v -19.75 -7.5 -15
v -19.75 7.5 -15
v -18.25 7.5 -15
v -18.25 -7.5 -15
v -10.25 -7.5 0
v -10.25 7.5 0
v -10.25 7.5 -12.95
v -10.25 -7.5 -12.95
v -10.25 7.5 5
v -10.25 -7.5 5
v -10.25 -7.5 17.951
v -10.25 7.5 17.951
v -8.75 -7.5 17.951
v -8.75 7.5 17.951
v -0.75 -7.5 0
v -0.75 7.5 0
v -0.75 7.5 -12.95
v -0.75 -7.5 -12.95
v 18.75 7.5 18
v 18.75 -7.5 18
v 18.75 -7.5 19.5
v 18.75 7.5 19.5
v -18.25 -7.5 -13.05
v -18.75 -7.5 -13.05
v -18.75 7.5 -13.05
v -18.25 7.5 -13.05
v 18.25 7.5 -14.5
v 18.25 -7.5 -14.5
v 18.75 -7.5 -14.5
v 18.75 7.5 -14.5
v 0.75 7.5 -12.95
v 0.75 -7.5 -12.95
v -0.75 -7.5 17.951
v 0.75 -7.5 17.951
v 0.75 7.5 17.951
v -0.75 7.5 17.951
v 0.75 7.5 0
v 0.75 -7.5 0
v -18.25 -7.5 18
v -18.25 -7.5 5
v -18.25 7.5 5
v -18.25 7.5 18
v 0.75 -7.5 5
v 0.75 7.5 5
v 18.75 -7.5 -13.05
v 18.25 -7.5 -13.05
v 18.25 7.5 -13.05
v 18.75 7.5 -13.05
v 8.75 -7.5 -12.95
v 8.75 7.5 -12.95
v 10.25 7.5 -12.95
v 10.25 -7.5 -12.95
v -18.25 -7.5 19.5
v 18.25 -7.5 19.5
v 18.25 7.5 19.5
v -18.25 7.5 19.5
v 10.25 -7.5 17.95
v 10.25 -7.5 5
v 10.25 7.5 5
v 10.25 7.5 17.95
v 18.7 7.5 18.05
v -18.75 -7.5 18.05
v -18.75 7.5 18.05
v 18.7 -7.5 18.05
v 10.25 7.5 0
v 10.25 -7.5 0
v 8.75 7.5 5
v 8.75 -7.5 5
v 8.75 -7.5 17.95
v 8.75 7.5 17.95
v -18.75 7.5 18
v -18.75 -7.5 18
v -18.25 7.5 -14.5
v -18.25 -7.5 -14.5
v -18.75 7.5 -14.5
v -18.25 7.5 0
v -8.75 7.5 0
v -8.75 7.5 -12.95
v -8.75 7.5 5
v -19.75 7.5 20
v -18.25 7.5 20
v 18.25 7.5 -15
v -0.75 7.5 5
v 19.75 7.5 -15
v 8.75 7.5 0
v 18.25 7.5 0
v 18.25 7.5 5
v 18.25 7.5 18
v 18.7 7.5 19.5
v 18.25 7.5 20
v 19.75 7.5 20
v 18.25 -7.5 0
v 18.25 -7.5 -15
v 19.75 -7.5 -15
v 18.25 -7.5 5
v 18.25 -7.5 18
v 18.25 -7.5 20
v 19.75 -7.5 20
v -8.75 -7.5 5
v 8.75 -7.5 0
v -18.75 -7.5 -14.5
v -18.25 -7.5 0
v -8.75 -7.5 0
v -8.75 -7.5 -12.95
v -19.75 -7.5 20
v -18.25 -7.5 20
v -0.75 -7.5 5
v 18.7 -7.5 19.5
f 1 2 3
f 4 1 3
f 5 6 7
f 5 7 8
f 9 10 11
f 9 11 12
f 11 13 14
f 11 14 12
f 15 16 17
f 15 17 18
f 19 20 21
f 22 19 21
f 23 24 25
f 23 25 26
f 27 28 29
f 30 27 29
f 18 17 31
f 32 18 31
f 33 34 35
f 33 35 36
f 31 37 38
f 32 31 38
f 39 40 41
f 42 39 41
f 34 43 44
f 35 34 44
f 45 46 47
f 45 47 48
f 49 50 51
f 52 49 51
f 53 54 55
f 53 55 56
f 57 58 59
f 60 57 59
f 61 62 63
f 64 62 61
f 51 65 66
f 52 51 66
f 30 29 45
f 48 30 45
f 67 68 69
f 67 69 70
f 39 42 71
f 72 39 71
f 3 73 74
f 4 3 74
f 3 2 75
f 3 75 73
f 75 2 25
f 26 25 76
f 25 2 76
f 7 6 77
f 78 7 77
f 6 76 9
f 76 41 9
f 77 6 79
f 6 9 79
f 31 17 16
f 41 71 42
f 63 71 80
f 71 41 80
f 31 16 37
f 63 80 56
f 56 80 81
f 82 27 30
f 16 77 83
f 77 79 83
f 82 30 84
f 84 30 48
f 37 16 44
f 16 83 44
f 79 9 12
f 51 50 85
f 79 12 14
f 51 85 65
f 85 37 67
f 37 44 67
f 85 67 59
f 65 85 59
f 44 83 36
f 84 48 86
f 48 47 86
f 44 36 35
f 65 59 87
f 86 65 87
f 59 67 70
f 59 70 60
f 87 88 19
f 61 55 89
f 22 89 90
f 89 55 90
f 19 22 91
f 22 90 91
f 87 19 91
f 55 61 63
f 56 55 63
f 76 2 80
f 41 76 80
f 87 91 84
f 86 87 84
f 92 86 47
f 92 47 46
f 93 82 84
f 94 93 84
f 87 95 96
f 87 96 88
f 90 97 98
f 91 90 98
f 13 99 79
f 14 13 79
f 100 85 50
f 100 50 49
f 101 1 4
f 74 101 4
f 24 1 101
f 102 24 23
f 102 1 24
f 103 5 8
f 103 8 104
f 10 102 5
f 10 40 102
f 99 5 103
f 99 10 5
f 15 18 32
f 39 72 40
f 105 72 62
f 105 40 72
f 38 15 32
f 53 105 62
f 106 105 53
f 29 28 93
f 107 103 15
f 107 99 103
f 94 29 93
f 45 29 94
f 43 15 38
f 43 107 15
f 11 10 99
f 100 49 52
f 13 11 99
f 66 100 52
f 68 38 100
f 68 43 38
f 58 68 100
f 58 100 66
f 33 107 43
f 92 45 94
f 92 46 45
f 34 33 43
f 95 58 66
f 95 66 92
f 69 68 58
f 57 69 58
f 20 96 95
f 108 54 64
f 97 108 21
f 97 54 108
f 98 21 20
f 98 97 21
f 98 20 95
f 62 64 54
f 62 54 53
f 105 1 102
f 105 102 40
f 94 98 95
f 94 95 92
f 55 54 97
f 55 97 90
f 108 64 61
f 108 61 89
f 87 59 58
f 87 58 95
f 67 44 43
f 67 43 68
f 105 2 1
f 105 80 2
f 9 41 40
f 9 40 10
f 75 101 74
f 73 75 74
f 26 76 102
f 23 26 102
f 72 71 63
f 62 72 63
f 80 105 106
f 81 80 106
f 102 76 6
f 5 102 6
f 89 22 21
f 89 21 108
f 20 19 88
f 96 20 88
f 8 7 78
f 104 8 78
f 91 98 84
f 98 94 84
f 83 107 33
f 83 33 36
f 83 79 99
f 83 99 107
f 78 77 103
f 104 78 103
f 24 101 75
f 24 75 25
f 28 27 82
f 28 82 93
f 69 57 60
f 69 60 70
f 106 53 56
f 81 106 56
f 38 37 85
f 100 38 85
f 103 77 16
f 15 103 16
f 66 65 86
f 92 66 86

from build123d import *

# Parameters (mm, degrees)
F0_W      = 39.5
F0_H      = 15
F1_DEPTH  = 5
F2_W      = 1.5
F2_H      = 15
F3_DEPTH  = 15
F5_W      = 1.5
F5_H      = 15
F6_DEPTH  = 15
F7_DEPTH  = 12.95
F9_W      = 0.5
F9_H      = 1.5
F10_DEPTH = 15
F9_W_2    = 1.5
F9_H_2    = 2.05
F9_H_3    = 2.0491243154
F11_DEPTH = 15
F13_DEPTH = 15
F14_W     = 0.5
F14_H     = 1.45
F15_DEPTH = 15


# Not quite as in the source:
# - the program builds the solid bodies; features that only make, move or delete a surface that nothing else refers to are left out


with BuildPart() as f1:
    # F0 (on Top) → F1 (new body)
    with BuildSketch(Plane.XY):
        Rectangle(F0_W, F0_H)
    extrude(amount=F1_DEPTH)

    # F2 (on face) → F3 (join)
    with BuildSketch(Plane.XY.offset(5)):
        with Locations((-19, 0)):
            Rectangle(F2_W, F2_H)
        with Locations((-9.5, 0)):
            Rectangle(F2_W, F2_H)
        Rectangle(F2_W, F2_H)
        with Locations((9.5, 0)):
            Rectangle(F2_W, F2_H)
        with Locations((19, 0)):
            Rectangle(F2_W, F2_H)
    extrude(amount=F3_DEPTH)

    # F5 (on face) → F6 (join)
    with BuildSketch(Plane(origin=(0, 0, 0), x_dir=(1, 0, 0), z_dir=(0, 0, -1))):
        with Locations((-19, 0)):
            Rectangle(F5_W, F5_H)
        with Locations((19, 0)):
            Rectangle(F5_W, F5_H)
    extrude(amount=F6_DEPTH)

    # F5 (on face) → F7 (join)
    with BuildSketch(Plane(origin=(0, 0, 0), x_dir=(1, 0, 0), z_dir=(0, 0, -1))):
        with Locations((-9.5, 0)):
            Rectangle(F5_W, F5_H)
        Rectangle(F5_W, F5_H)
        with Locations((9.5, 0)):
            Rectangle(F5_W, F5_H)
    extrude(amount=F7_DEPTH)

    # F9 (on face) → F10 (cut)
    with BuildSketch(Plane(origin=(0, 7.5, 0), x_dir=(-1, 0, 0), z_dir=(0, 1, 0))):
        with Locations((18.5, 18.75)):
            Rectangle(F9_W, F9_H)
        with Locations((-18.5, 18.75)):
            Rectangle(F9_W, F9_H)
    extrude(amount=-F10_DEPTH, mode=Mode.SUBTRACT)

    # F9 (on face) → F11 (cut)
    with BuildSketch(Plane(origin=(0, 7.5, 0), x_dir=(-1, 0, 0), z_dir=(0, 1, 0))):
        with Locations((-9.5, 18.975)):
            Rectangle(F9_W_2, F9_H_2)
        with Locations((0, 18.9754378423)):
            Rectangle(F9_W_2, F9_H_3)
        with Locations((9.5, 18.9754378423)):
            Rectangle(F9_W_2, F9_H_3)
    extrude(amount=-F11_DEPTH, mode=Mode.SUBTRACT)

    # F12 (on face) → F13 (join)
    with BuildSketch(Plane.XZ.offset(7.5)):
        Polygon((-18.25, 19.5), (-18.75, 19.5), (-18.75, 18.05), (18.7, 18.05), (18.7, 19.5), (18.25, 19.5), align=None)
    extrude(amount=-F13_DEPTH)

    # F14 (on face) → F15 (cut)
    with BuildSketch(Plane.XZ.offset(7.5)):
        with Locations((18.5, -13.775)):
            Rectangle(F14_W, F14_H)
        with Locations((-18.5, -13.775)):
            Rectangle(F14_W, F14_H)
    extrude(amount=-F15_DEPTH, mode=Mode.SUBTRACT)


solid = f1.part
